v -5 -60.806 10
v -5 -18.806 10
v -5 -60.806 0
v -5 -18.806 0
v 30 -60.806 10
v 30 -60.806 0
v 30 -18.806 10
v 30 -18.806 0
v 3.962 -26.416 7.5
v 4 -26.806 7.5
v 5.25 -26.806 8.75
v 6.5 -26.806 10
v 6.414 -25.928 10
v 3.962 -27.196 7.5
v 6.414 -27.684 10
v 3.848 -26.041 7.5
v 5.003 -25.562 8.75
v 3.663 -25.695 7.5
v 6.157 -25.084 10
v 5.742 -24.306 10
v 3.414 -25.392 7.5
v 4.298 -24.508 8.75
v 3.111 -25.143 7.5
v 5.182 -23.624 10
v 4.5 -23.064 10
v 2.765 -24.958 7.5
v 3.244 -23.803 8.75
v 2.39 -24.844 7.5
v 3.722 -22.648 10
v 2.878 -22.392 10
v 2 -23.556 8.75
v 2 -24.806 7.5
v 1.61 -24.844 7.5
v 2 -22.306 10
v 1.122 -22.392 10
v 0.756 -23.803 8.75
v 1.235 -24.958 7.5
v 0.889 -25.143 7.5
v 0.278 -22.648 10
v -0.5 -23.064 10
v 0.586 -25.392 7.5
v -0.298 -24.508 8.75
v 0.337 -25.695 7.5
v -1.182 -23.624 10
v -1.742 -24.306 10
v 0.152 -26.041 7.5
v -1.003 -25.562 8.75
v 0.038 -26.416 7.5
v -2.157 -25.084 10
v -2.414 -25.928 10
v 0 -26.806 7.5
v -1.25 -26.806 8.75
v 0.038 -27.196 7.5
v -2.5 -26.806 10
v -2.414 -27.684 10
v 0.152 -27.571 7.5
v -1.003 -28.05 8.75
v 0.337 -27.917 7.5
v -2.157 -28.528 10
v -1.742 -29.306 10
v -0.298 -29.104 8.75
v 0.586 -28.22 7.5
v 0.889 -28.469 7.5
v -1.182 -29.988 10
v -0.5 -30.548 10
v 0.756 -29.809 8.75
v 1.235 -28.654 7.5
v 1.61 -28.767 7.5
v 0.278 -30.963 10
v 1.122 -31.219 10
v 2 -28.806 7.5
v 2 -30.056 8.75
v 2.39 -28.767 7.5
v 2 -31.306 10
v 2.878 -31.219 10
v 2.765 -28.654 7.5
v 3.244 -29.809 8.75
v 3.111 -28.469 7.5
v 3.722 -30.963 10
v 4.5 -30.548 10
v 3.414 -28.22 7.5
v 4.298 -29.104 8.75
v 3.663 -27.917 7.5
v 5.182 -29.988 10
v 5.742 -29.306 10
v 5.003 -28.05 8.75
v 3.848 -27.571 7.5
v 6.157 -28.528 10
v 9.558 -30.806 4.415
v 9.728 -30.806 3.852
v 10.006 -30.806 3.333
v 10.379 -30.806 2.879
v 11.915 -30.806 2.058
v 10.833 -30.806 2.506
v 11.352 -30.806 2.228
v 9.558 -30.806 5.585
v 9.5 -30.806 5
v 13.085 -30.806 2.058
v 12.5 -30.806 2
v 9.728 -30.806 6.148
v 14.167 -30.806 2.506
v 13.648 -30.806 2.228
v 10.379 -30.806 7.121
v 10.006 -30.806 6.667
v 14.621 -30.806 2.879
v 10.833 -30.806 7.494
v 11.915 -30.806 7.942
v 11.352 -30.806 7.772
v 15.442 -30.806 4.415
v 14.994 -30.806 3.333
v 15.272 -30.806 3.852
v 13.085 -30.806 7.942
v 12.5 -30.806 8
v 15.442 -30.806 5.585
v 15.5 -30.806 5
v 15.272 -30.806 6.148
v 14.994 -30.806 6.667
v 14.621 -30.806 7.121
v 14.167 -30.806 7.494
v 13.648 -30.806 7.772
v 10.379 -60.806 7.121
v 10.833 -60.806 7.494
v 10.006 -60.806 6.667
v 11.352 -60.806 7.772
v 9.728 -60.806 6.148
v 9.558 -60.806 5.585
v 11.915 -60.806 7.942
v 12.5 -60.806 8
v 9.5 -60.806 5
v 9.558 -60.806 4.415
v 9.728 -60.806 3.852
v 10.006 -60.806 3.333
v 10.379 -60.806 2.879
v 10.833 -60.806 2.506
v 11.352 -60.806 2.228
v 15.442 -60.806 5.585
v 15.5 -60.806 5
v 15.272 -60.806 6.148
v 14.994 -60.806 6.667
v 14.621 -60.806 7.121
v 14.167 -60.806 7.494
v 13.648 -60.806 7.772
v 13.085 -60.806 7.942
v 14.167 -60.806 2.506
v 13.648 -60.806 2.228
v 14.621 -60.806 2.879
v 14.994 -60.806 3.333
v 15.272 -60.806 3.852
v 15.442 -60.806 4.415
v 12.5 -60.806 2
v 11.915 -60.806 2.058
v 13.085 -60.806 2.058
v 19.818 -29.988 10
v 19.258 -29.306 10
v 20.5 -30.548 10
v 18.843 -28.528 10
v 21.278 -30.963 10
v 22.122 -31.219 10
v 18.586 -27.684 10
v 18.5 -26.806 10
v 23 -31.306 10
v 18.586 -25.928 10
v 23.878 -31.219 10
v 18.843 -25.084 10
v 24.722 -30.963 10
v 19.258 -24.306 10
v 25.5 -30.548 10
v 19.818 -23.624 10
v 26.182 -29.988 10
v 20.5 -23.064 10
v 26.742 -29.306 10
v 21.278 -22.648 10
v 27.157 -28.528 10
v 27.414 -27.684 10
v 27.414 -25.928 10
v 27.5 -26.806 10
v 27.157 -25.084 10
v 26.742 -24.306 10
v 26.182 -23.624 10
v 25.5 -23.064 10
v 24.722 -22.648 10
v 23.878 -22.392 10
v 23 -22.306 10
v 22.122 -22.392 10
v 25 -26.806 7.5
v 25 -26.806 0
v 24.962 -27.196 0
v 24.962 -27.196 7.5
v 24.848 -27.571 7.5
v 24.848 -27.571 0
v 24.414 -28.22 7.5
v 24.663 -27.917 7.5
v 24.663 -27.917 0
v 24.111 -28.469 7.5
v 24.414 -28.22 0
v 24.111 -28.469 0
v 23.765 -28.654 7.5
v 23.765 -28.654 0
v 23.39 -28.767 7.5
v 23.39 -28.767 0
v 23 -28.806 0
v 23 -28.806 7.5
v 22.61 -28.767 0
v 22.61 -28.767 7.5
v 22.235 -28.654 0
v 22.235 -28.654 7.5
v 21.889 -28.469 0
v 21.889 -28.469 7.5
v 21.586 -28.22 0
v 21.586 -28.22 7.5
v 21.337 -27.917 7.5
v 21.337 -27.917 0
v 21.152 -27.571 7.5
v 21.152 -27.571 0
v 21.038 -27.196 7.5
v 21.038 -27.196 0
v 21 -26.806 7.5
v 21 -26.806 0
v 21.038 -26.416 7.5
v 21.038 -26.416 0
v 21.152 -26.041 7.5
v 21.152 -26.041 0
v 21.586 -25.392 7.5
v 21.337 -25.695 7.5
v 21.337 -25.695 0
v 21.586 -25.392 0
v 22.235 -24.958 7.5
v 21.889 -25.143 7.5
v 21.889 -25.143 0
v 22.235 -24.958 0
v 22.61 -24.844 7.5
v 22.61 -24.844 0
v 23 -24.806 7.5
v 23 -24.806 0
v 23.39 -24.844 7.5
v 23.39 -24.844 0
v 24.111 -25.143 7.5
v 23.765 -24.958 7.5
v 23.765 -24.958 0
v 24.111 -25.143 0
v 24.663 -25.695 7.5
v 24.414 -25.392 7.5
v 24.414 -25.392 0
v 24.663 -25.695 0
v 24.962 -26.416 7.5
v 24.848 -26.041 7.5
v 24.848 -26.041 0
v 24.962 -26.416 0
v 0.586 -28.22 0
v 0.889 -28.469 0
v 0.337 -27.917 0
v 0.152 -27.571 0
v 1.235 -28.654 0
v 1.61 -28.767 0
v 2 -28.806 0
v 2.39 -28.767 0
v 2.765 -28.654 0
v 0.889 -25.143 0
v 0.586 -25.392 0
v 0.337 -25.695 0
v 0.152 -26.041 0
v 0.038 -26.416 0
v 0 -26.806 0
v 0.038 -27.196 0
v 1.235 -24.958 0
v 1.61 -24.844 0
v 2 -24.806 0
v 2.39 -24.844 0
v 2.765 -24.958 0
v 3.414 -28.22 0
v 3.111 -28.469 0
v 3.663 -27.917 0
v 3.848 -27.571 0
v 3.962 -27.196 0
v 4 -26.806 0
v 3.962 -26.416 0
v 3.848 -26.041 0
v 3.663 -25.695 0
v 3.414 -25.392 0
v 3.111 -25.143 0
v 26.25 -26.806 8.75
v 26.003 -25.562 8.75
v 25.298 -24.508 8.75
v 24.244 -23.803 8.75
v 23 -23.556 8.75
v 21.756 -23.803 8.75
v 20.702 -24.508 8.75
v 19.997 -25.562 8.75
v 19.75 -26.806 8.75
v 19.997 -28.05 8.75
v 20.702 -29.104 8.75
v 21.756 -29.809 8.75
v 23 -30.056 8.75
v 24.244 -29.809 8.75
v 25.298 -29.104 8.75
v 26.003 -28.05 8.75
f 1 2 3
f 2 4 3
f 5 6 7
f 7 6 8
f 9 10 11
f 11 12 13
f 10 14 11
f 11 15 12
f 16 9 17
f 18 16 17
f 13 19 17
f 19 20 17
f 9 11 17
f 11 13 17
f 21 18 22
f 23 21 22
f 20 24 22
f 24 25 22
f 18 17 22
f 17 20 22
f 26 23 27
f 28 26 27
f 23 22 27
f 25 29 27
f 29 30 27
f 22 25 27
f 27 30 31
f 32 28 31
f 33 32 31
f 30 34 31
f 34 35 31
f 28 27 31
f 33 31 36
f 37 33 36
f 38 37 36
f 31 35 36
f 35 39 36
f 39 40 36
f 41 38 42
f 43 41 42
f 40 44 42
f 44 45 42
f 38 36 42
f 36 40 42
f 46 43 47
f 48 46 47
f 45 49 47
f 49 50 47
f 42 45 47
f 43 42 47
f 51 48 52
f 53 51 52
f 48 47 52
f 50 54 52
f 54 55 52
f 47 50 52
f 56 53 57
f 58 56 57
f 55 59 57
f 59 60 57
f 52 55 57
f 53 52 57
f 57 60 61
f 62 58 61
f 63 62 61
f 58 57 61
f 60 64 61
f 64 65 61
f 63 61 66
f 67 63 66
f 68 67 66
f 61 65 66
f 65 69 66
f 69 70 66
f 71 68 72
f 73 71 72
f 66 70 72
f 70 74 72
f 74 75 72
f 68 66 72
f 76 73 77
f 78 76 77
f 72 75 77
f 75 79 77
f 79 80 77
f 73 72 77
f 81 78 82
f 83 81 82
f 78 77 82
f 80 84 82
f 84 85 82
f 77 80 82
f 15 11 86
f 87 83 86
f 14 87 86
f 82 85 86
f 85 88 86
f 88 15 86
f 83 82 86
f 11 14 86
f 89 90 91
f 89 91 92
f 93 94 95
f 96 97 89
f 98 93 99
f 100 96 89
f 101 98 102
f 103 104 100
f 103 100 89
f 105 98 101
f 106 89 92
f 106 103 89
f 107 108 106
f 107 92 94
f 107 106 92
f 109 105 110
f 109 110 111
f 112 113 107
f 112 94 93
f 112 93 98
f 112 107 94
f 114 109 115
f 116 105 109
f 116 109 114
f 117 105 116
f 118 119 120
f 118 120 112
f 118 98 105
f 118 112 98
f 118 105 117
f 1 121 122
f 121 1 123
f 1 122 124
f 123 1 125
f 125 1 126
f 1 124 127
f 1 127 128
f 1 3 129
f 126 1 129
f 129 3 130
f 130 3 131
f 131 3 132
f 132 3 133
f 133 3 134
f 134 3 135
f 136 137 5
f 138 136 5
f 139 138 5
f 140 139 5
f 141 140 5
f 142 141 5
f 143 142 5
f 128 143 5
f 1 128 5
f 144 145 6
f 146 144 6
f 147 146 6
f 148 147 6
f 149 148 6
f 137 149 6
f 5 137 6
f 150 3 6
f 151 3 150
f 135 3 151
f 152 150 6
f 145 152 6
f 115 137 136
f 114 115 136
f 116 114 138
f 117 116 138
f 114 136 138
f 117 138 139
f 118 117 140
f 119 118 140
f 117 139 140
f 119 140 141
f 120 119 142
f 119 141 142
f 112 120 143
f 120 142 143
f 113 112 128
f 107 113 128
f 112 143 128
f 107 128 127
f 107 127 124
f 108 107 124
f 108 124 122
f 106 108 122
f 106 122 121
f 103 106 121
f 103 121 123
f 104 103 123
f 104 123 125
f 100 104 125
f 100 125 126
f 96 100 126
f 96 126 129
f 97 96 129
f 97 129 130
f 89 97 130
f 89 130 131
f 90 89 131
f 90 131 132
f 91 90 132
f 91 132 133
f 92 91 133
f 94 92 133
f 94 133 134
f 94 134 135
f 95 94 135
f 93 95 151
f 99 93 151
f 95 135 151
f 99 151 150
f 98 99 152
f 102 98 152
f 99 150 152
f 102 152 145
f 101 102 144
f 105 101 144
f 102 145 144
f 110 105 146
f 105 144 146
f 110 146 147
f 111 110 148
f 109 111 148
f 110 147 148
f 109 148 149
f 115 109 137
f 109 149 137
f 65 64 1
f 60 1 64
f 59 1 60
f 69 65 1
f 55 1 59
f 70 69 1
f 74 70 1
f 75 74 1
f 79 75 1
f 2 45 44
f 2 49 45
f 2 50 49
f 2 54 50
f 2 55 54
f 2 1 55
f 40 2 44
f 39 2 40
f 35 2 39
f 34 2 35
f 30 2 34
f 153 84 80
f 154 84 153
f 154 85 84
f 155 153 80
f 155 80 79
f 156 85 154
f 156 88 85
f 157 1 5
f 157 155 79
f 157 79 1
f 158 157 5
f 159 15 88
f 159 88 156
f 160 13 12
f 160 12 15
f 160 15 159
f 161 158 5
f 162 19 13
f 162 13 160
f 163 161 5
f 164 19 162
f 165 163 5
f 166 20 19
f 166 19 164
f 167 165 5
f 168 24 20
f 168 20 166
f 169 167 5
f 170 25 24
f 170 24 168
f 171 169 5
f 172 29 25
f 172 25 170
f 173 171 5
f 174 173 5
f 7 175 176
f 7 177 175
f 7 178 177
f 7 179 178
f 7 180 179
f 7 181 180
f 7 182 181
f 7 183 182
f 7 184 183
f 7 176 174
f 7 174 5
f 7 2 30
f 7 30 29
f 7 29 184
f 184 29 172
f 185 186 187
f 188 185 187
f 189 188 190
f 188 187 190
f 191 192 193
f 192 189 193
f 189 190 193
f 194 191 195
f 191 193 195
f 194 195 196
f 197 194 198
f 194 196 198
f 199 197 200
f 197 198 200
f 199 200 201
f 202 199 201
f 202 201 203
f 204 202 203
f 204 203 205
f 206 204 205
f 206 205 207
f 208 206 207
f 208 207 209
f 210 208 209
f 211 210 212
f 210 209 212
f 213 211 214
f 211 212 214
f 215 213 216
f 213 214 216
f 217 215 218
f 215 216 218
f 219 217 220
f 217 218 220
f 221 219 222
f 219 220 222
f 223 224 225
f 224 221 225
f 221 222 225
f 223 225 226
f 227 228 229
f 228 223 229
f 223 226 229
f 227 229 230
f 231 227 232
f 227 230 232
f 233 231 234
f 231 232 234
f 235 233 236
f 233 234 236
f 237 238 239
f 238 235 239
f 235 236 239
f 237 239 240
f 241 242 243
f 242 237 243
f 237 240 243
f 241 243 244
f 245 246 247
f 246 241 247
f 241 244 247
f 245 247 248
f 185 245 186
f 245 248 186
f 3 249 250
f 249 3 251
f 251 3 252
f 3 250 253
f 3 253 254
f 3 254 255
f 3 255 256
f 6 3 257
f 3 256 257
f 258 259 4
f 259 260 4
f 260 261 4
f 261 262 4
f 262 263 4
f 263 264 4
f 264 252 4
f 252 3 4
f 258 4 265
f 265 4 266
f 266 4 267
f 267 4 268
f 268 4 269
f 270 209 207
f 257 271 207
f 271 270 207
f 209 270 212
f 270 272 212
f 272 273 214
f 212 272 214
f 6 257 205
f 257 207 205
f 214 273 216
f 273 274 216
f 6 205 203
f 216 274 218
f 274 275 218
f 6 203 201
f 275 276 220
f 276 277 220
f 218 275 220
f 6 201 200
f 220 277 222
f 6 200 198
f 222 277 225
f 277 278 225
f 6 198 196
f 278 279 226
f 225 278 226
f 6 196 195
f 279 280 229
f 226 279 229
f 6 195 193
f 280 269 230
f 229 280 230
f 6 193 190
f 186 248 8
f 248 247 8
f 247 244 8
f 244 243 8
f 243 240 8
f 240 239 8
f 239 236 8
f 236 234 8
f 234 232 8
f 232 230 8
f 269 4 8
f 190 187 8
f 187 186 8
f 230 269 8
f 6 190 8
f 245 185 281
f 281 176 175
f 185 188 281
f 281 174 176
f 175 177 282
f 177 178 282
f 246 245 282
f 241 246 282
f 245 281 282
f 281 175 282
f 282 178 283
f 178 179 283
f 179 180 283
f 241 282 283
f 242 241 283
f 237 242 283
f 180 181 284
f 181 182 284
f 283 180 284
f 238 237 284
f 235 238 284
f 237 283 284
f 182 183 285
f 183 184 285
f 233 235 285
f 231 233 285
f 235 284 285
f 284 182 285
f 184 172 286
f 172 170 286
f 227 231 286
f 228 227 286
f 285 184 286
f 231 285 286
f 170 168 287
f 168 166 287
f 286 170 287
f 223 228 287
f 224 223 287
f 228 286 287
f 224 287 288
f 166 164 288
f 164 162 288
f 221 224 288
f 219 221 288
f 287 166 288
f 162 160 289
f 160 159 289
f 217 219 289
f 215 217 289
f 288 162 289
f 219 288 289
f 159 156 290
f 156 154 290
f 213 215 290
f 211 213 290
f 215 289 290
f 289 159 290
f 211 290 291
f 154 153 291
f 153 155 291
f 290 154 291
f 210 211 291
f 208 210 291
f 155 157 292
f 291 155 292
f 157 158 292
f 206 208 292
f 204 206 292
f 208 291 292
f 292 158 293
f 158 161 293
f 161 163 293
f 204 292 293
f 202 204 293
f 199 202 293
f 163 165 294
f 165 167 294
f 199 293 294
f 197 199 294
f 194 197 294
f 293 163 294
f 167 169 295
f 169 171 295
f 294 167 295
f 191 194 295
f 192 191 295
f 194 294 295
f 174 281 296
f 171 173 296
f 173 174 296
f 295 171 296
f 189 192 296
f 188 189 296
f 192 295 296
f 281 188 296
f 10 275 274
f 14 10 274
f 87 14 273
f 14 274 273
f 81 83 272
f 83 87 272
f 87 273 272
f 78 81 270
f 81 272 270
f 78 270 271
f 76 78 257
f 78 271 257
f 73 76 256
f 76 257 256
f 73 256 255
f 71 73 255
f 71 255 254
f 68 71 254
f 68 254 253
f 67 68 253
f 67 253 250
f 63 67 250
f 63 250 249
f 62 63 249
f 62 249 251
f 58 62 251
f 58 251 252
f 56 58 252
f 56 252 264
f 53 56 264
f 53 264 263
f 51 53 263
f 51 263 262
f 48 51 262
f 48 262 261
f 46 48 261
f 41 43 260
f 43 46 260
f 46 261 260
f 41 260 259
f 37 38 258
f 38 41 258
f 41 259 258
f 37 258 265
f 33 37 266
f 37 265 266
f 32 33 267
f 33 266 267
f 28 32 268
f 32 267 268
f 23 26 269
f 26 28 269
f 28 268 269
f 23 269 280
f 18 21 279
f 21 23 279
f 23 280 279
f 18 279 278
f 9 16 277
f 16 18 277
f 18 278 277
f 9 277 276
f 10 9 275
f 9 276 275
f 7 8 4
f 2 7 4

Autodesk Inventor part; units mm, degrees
ref_plane "YZ Plane" through (0, 0, 0) normal (1, 0, 0) x (0, 1, 0)
ref_plane "XZ Plane" through (0, 0, 0) normal (0, 1, 0) x (-1, 0, 0)
ref_plane "XY Plane" through (0, 0, 0) normal (0, 0, 1) x (1, 0, 0)
sketch "Sketch1" plane through (0, 0, 0) normal (0, 0, 1) x (1, 0, 0)
  line L0 (-5, -18.8059) -> (-5, -60.8059)
  line L1 (-5, -60.8059) -> (30, -60.8059)
  line L2 (30, -60.8059) -> (30, -18.8059)
  circle A0 centre (2, -26.8059) radius 2
  circle A1 centre (23, -26.8059) radius 2
  circle A2 centre (2, -26.8059) radius 4
  circle A3 centre (23, -26.8059) radius 4
  line L3 (30, -18.8059) -> (-5, -18.8059)
  point P0 (0, -10)
  dimension "d17" = 35
  dimension "d19" = 4
  dimension "d20" = 4
  dimension "d22" = 8
  dimension "d23" = 8
  dimension "d29" = 7
  dimension "d60" = 42
  dimension "d61" = 8
  dimension "d62" = 8
  dimension "d63" = 21
extrude "Extrusion2" add sketch "Sketch1" along normal blind 10 contours L3 L2 L1 L0 | A2 | A3
sketch "Sketch4" plane through (-5, -60.8059, 0) normal (0, -1, 0) x (1, 0, 0)
  circle A0 centre (17.5, 5) radius 3
  line L0 (35, 0) -> (35, 10) projected
  line L1 (0, 10) -> (35, 10) projected
  dimension "d48" = 6
  dimension "d49" = 17.5
  dimension "d50" = 5
extrude "Extrusion5" cut sketch "Sketch4" against normal blind 30
thread "Thread2" size "M6x1" class "6H" standard "ANSI Metric M Profile" length 25
chamfer "Chaflán1" distance 2.5 angle 45 2 edges at (0, -26.8059, 10) (21, -26.8059, 10)
equation "\"d61\" = d62"
properties part number "Soporte para Patas Regulables" material "Aluminum 6061"
